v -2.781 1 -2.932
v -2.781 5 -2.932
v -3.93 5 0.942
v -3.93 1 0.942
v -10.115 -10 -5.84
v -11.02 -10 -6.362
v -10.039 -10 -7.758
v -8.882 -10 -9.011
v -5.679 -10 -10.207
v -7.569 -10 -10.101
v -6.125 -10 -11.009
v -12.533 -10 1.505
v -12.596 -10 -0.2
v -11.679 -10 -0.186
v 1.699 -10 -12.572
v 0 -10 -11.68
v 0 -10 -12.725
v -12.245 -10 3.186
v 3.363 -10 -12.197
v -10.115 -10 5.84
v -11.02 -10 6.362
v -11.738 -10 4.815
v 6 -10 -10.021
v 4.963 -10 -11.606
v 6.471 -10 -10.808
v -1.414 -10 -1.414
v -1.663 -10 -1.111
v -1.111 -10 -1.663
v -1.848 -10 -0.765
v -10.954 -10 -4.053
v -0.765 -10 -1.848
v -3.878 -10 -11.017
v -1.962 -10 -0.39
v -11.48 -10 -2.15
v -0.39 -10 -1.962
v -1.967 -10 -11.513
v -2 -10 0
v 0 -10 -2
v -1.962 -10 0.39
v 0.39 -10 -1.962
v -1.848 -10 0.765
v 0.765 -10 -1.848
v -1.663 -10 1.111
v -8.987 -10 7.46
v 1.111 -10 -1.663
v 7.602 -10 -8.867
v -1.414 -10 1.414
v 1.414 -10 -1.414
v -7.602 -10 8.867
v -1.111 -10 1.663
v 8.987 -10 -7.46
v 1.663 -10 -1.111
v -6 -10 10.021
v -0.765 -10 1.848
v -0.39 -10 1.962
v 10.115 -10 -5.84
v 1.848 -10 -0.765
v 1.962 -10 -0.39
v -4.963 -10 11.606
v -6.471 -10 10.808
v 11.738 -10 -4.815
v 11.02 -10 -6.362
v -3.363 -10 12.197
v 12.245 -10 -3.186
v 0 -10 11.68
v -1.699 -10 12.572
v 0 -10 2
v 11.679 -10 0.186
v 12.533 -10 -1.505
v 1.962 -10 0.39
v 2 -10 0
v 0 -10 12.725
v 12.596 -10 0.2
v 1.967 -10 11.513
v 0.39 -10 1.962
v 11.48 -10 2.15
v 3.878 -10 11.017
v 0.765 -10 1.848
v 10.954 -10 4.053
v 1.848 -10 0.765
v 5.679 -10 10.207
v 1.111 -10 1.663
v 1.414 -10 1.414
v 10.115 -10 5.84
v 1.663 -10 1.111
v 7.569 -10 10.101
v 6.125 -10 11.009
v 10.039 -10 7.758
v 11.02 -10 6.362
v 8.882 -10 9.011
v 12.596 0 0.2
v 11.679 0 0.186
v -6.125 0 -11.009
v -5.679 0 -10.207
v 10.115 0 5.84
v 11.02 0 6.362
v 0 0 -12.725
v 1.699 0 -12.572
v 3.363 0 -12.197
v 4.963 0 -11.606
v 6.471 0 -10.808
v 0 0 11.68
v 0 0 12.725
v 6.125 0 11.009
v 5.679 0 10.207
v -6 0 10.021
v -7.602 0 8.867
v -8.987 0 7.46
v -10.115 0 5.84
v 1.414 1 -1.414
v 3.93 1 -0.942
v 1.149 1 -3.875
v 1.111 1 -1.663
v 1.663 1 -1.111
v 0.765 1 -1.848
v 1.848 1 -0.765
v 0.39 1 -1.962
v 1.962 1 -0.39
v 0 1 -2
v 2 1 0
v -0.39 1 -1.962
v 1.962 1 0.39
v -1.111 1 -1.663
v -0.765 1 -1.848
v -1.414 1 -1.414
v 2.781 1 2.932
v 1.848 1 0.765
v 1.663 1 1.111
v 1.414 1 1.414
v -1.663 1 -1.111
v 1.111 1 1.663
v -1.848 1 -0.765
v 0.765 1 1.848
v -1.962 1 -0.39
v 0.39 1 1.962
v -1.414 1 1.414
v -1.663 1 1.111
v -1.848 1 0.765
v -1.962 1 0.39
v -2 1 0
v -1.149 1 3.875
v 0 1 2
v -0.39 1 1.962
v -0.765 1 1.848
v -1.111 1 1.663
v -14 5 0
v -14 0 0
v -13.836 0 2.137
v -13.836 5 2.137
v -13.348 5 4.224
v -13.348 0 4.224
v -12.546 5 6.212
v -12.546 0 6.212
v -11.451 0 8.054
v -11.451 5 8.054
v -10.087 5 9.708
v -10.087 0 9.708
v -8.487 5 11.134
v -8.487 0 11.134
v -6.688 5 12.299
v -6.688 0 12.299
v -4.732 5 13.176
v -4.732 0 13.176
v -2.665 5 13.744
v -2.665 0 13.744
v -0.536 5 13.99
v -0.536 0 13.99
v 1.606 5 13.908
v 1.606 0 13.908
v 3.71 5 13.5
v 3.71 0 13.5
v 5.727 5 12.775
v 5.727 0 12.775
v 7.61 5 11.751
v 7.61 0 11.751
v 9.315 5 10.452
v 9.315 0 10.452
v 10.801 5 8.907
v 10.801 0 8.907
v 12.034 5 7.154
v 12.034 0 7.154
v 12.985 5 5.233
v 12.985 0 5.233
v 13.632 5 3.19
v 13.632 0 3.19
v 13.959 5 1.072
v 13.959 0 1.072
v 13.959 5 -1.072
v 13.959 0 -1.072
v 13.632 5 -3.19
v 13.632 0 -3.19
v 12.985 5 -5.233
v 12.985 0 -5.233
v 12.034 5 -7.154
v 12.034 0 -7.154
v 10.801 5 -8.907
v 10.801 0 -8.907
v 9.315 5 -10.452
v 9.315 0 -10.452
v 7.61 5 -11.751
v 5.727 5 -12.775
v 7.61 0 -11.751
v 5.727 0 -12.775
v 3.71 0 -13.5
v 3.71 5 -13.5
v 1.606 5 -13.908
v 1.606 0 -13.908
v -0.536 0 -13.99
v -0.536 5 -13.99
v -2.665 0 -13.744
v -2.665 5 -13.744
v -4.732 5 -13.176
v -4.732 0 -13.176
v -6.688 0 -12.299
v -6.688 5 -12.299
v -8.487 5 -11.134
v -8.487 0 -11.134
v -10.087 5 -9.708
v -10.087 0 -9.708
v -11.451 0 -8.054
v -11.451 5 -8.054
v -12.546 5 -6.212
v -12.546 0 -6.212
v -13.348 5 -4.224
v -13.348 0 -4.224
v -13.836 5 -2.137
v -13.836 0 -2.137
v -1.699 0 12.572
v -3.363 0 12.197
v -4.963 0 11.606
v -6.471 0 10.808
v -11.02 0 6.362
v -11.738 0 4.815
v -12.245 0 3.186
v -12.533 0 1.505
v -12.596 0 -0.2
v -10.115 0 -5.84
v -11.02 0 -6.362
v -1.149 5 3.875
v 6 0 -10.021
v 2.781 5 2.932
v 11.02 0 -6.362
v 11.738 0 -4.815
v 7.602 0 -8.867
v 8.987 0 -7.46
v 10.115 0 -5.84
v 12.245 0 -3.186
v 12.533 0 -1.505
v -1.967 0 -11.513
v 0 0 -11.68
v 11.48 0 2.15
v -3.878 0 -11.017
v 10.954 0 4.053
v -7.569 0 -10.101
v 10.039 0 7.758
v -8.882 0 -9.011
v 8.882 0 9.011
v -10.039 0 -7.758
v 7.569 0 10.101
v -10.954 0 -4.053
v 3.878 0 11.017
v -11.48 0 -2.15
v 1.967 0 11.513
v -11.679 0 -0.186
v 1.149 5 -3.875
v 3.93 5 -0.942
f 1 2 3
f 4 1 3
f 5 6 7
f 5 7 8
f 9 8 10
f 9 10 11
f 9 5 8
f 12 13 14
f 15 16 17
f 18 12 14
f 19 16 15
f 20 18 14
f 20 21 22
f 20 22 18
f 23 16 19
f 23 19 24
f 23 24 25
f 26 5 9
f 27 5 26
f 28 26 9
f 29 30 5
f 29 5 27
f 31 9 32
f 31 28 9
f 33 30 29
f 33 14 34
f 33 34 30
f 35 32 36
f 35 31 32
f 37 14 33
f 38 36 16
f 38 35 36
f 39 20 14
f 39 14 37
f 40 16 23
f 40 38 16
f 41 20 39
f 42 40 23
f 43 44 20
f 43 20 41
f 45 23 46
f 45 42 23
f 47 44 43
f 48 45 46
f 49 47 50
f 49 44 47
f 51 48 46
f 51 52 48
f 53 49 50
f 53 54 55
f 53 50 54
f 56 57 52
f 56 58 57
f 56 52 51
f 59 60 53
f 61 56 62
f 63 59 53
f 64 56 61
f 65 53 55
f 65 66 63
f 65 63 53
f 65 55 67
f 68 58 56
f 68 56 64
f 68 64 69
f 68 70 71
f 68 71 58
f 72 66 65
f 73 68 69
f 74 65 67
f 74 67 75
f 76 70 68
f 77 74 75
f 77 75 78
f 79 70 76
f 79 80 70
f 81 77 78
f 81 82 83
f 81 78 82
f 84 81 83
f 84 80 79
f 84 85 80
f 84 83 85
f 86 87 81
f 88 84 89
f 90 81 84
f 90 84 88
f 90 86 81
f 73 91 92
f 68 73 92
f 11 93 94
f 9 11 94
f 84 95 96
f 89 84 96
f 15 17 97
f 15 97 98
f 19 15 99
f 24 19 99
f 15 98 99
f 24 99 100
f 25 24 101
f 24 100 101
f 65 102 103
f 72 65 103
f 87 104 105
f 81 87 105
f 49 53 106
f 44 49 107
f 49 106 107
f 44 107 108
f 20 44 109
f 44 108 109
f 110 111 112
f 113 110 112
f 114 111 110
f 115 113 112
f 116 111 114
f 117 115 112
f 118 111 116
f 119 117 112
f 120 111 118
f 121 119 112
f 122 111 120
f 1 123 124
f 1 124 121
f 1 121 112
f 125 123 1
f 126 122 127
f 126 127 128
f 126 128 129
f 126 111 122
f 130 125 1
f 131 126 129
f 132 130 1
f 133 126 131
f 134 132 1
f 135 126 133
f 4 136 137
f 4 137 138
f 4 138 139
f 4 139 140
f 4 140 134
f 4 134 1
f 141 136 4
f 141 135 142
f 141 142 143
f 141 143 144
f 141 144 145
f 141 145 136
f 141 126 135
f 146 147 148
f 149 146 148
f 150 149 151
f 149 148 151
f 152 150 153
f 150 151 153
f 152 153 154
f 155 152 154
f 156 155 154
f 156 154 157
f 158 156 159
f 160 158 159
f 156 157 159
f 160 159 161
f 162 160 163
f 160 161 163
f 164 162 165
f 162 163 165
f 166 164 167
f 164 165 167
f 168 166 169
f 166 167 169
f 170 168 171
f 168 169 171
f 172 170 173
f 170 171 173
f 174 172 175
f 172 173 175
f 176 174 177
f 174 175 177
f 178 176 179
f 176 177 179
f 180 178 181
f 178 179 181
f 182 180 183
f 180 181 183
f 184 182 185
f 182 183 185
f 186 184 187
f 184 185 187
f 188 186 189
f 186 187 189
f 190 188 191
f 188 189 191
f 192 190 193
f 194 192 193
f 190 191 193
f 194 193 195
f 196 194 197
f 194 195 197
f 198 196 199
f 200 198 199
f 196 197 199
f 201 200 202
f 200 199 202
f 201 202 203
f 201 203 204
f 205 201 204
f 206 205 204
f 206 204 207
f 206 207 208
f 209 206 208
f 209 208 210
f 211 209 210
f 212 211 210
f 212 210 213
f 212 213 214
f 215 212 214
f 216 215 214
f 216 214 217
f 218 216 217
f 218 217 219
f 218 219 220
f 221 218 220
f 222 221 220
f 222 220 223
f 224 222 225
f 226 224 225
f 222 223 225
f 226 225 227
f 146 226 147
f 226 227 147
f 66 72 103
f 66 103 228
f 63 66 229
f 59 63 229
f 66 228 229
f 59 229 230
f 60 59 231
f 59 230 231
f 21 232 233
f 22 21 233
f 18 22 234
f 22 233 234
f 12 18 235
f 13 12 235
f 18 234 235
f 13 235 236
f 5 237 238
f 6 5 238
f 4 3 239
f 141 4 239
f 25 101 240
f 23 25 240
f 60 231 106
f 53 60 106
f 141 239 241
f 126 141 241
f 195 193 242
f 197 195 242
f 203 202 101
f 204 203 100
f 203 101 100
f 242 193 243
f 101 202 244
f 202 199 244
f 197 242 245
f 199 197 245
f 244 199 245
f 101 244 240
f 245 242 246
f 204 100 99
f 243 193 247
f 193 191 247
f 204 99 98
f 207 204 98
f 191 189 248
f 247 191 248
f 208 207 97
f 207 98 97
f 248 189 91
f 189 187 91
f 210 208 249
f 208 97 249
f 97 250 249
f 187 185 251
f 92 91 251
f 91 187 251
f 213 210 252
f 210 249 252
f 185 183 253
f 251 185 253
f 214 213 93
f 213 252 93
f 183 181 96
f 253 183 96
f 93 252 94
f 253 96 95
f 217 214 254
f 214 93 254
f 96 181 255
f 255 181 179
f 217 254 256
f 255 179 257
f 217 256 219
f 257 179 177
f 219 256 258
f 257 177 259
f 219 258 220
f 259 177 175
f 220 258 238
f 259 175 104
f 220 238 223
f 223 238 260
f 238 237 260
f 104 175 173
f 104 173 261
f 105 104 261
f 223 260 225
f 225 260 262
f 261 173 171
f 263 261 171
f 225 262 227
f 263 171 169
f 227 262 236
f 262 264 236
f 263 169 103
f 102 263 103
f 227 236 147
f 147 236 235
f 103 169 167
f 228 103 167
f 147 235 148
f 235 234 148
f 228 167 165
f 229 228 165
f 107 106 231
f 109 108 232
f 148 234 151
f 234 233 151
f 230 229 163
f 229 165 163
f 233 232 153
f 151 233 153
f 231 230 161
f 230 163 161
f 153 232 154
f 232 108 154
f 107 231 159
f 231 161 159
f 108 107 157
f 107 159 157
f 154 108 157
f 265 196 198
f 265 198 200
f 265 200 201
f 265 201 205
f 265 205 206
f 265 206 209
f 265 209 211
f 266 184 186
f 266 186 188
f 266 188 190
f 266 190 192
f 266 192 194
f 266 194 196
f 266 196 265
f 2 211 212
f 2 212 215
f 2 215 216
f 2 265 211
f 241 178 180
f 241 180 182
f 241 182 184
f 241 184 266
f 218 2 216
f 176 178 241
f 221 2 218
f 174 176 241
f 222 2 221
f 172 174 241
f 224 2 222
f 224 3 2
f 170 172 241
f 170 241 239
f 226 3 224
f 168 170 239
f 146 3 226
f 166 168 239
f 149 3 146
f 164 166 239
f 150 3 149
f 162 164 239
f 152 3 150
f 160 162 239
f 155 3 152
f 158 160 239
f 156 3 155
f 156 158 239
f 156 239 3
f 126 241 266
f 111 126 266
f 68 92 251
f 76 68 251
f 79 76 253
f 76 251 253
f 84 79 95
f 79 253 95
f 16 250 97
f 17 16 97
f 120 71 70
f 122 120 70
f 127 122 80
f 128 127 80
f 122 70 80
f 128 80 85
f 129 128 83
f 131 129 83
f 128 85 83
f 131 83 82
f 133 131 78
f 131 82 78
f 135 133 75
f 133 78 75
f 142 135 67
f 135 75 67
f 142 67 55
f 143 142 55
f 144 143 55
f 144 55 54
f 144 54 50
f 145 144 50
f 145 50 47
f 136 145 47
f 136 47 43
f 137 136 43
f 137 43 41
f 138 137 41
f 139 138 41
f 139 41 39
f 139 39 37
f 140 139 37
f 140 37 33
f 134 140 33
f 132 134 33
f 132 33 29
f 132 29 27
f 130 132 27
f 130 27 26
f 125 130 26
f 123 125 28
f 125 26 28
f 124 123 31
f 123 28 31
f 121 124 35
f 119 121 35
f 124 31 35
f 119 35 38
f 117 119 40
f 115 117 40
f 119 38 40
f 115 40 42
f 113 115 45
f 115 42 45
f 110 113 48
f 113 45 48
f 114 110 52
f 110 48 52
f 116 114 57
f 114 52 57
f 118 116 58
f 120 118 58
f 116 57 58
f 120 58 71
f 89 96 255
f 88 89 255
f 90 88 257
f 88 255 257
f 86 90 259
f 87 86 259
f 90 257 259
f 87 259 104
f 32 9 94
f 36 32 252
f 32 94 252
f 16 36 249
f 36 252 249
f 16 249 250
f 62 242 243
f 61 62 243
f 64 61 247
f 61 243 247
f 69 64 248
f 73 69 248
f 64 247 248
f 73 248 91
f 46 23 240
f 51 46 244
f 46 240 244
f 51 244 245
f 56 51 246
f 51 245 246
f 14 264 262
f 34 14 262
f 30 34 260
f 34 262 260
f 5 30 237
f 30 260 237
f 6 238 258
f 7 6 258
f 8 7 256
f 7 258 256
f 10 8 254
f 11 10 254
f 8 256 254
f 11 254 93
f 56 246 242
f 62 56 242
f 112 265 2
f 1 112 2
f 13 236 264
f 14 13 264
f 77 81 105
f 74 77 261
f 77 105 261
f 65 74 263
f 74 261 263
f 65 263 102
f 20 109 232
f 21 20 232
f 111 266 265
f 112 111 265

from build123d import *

# Parameters (mm, degrees)
F1_DEPTH = 10
F3_R     = 14
F4_DEPTH = 5
F2_R     = 2
F5_DEPTH = 40
F7_DEPTH = 4


with BuildPart() as f1:
    # F0 (on Front) → F1 (new body)
    with BuildSketch(Plane.XZ):
        with BuildLine():
            ThreePointArc((10.115177, -5.84), (11.282014, -3.023006), (11.68, 0))
            ThreePointArc((11.68, 0), (11.679631, 0.092805), (11.678525, 0.185604))
            ThreePointArc((11.678525, 0.185604), (11.257638, 3.112553), (10.115177, 5.84))
            ThreePointArc((10.115177, 5.84), (8.193124, 8.324369), (5.678525, 10.206701))
            ThreePointArc((5.678525, 10.206701), (2.933269, 11.305677), (0, 11.68))
            ThreePointArc((0, 11.68), (-3.112553, 11.257638), (-6, 10.021098))
            ThreePointArc((-6, 10.021098), (-8.324369, 8.193124), (-10.115177, 5.84))
            ThreePointArc((-10.115177, 5.84), (-11.305677, 2.933269), (-11.678525, -0.185604))
            ThreePointArc((-11.678525, -0.185604), (-11.257638, -3.112553), (-10.115177, -5.84))
            ThreePointArc((-10.115177, -5.84), (-8.193124, -8.324369), (-5.678525, -10.206701))
            ThreePointArc((-5.678525, -10.206701), (-2.933269, -11.305677), (0, -11.68))
            ThreePointArc((0, -11.68), (3.112553, -11.257638), (6, -10.021098))
            ThreePointArc((6, -10.021098), (8.324369, -8.193124), (10.115177, -5.84))
        make_face()
        with BuildLine():
            ThreePointArc((11.678525, 0.185604), (11.679631, 0.092805), (11.68, 0))
            ThreePointArc((11.68, 0), (11.282014, -3.023006), (10.115177, -5.84))
            Line((10.115177, -5.84), (11.01996, -6.362377))
            ThreePointArc((11.01996, -6.362377), (12.244829, -3.186001), (12.596117, 0.200187))
            Line((12.596117, 0.200187), (11.678525, 0.185604))
        make_face()
        with BuildLine():
            ThreePointArc((5.678525, 10.206701), (8.193124, 8.324369), (10.115177, 5.84))
            Line((10.115177, 5.84), (11.01996, 6.362377))
            ThreePointArc((11.01996, 6.362377), (8.881572, 9.011333), (6.124692, 11.00865))
            Line((6.124692, 11.00865), (5.678525, 10.206701))
        make_face()
        with BuildLine():
            Line((6.471425, -10.808464), (6, -10.021098))
            ThreePointArc((6, -10.021098), (3.112553, -11.257638), (0, -11.68))
            Line((0, -11.68), (0, -12.724753))
            ThreePointArc((0, -12.724753), (3.363257, -12.197333), (6.471425, -10.808464))
        make_face()
        with BuildLine():
            ThreePointArc((-6, 10.021098), (-3.112553, 11.257638), (0, 11.68))
            Line((0, 11.68), (0, 12.724753))
            ThreePointArc((0, 12.724753), (-3.363257, 12.197333), (-6.471425, 10.808464))
            Line((-6.471425, 10.808464), (-6, 10.021098))
        make_face()
        with BuildLine():
            Line((-6.124692, -11.00865), (-5.678525, -10.206701))
            ThreePointArc((-5.678525, -10.206701), (-8.193124, -8.324369), (-10.115177, -5.84))
            Line((-10.115177, -5.84), (-11.01996, -6.362377))
            ThreePointArc((-11.01996, -6.362377), (-8.881572, -9.011333), (-6.124692, -11.00865))
        make_face()
        with BuildLine():
            ThreePointArc((-11.678525, -0.185604), (-11.305677, 2.933269), (-10.115177, 5.84))
            Line((-10.115177, 5.84), (-11.01996, 6.362377))
            ThreePointArc((-11.01996, 6.362377), (-12.244829, 3.186001), (-12.596117, -0.200187))
            Line((-12.596117, -0.200187), (-11.678525, -0.185604))
        make_face()
    extrude(amount=F1_DEPTH)

    # F3 (on face) → F4 (join)
    with BuildSketch(Plane(origin=(0, 0, 0), x_dir=(-1, 0, 0), z_dir=(0, 1, 0))):
        Circle(F3_R)
    extrude(amount=F4_DEPTH)

    # F2 (on face) → F5 (cut)
    with BuildSketch(Plane.XZ.offset(10)):
        Circle(F2_R)
    extrude(amount=-F5_DEPTH, mode=Mode.SUBTRACT)

    # F6 (on face) → F7 (cut)
    with BuildSketch(Plane(origin=(0, 5, 0), x_dir=(-1, 0, 0), z_dir=(0, 1, 0))):
        Polygon((1.148891, 3.874711), (-2.781153, 2.932324), (-3.930043, -0.942387), (-1.148891, -3.874711), (2.781153, -2.932324), (3.930043, 0.942387), align=None)
    extrude(amount=-F7_DEPTH, mode=Mode.SUBTRACT)


solid = f1.part
